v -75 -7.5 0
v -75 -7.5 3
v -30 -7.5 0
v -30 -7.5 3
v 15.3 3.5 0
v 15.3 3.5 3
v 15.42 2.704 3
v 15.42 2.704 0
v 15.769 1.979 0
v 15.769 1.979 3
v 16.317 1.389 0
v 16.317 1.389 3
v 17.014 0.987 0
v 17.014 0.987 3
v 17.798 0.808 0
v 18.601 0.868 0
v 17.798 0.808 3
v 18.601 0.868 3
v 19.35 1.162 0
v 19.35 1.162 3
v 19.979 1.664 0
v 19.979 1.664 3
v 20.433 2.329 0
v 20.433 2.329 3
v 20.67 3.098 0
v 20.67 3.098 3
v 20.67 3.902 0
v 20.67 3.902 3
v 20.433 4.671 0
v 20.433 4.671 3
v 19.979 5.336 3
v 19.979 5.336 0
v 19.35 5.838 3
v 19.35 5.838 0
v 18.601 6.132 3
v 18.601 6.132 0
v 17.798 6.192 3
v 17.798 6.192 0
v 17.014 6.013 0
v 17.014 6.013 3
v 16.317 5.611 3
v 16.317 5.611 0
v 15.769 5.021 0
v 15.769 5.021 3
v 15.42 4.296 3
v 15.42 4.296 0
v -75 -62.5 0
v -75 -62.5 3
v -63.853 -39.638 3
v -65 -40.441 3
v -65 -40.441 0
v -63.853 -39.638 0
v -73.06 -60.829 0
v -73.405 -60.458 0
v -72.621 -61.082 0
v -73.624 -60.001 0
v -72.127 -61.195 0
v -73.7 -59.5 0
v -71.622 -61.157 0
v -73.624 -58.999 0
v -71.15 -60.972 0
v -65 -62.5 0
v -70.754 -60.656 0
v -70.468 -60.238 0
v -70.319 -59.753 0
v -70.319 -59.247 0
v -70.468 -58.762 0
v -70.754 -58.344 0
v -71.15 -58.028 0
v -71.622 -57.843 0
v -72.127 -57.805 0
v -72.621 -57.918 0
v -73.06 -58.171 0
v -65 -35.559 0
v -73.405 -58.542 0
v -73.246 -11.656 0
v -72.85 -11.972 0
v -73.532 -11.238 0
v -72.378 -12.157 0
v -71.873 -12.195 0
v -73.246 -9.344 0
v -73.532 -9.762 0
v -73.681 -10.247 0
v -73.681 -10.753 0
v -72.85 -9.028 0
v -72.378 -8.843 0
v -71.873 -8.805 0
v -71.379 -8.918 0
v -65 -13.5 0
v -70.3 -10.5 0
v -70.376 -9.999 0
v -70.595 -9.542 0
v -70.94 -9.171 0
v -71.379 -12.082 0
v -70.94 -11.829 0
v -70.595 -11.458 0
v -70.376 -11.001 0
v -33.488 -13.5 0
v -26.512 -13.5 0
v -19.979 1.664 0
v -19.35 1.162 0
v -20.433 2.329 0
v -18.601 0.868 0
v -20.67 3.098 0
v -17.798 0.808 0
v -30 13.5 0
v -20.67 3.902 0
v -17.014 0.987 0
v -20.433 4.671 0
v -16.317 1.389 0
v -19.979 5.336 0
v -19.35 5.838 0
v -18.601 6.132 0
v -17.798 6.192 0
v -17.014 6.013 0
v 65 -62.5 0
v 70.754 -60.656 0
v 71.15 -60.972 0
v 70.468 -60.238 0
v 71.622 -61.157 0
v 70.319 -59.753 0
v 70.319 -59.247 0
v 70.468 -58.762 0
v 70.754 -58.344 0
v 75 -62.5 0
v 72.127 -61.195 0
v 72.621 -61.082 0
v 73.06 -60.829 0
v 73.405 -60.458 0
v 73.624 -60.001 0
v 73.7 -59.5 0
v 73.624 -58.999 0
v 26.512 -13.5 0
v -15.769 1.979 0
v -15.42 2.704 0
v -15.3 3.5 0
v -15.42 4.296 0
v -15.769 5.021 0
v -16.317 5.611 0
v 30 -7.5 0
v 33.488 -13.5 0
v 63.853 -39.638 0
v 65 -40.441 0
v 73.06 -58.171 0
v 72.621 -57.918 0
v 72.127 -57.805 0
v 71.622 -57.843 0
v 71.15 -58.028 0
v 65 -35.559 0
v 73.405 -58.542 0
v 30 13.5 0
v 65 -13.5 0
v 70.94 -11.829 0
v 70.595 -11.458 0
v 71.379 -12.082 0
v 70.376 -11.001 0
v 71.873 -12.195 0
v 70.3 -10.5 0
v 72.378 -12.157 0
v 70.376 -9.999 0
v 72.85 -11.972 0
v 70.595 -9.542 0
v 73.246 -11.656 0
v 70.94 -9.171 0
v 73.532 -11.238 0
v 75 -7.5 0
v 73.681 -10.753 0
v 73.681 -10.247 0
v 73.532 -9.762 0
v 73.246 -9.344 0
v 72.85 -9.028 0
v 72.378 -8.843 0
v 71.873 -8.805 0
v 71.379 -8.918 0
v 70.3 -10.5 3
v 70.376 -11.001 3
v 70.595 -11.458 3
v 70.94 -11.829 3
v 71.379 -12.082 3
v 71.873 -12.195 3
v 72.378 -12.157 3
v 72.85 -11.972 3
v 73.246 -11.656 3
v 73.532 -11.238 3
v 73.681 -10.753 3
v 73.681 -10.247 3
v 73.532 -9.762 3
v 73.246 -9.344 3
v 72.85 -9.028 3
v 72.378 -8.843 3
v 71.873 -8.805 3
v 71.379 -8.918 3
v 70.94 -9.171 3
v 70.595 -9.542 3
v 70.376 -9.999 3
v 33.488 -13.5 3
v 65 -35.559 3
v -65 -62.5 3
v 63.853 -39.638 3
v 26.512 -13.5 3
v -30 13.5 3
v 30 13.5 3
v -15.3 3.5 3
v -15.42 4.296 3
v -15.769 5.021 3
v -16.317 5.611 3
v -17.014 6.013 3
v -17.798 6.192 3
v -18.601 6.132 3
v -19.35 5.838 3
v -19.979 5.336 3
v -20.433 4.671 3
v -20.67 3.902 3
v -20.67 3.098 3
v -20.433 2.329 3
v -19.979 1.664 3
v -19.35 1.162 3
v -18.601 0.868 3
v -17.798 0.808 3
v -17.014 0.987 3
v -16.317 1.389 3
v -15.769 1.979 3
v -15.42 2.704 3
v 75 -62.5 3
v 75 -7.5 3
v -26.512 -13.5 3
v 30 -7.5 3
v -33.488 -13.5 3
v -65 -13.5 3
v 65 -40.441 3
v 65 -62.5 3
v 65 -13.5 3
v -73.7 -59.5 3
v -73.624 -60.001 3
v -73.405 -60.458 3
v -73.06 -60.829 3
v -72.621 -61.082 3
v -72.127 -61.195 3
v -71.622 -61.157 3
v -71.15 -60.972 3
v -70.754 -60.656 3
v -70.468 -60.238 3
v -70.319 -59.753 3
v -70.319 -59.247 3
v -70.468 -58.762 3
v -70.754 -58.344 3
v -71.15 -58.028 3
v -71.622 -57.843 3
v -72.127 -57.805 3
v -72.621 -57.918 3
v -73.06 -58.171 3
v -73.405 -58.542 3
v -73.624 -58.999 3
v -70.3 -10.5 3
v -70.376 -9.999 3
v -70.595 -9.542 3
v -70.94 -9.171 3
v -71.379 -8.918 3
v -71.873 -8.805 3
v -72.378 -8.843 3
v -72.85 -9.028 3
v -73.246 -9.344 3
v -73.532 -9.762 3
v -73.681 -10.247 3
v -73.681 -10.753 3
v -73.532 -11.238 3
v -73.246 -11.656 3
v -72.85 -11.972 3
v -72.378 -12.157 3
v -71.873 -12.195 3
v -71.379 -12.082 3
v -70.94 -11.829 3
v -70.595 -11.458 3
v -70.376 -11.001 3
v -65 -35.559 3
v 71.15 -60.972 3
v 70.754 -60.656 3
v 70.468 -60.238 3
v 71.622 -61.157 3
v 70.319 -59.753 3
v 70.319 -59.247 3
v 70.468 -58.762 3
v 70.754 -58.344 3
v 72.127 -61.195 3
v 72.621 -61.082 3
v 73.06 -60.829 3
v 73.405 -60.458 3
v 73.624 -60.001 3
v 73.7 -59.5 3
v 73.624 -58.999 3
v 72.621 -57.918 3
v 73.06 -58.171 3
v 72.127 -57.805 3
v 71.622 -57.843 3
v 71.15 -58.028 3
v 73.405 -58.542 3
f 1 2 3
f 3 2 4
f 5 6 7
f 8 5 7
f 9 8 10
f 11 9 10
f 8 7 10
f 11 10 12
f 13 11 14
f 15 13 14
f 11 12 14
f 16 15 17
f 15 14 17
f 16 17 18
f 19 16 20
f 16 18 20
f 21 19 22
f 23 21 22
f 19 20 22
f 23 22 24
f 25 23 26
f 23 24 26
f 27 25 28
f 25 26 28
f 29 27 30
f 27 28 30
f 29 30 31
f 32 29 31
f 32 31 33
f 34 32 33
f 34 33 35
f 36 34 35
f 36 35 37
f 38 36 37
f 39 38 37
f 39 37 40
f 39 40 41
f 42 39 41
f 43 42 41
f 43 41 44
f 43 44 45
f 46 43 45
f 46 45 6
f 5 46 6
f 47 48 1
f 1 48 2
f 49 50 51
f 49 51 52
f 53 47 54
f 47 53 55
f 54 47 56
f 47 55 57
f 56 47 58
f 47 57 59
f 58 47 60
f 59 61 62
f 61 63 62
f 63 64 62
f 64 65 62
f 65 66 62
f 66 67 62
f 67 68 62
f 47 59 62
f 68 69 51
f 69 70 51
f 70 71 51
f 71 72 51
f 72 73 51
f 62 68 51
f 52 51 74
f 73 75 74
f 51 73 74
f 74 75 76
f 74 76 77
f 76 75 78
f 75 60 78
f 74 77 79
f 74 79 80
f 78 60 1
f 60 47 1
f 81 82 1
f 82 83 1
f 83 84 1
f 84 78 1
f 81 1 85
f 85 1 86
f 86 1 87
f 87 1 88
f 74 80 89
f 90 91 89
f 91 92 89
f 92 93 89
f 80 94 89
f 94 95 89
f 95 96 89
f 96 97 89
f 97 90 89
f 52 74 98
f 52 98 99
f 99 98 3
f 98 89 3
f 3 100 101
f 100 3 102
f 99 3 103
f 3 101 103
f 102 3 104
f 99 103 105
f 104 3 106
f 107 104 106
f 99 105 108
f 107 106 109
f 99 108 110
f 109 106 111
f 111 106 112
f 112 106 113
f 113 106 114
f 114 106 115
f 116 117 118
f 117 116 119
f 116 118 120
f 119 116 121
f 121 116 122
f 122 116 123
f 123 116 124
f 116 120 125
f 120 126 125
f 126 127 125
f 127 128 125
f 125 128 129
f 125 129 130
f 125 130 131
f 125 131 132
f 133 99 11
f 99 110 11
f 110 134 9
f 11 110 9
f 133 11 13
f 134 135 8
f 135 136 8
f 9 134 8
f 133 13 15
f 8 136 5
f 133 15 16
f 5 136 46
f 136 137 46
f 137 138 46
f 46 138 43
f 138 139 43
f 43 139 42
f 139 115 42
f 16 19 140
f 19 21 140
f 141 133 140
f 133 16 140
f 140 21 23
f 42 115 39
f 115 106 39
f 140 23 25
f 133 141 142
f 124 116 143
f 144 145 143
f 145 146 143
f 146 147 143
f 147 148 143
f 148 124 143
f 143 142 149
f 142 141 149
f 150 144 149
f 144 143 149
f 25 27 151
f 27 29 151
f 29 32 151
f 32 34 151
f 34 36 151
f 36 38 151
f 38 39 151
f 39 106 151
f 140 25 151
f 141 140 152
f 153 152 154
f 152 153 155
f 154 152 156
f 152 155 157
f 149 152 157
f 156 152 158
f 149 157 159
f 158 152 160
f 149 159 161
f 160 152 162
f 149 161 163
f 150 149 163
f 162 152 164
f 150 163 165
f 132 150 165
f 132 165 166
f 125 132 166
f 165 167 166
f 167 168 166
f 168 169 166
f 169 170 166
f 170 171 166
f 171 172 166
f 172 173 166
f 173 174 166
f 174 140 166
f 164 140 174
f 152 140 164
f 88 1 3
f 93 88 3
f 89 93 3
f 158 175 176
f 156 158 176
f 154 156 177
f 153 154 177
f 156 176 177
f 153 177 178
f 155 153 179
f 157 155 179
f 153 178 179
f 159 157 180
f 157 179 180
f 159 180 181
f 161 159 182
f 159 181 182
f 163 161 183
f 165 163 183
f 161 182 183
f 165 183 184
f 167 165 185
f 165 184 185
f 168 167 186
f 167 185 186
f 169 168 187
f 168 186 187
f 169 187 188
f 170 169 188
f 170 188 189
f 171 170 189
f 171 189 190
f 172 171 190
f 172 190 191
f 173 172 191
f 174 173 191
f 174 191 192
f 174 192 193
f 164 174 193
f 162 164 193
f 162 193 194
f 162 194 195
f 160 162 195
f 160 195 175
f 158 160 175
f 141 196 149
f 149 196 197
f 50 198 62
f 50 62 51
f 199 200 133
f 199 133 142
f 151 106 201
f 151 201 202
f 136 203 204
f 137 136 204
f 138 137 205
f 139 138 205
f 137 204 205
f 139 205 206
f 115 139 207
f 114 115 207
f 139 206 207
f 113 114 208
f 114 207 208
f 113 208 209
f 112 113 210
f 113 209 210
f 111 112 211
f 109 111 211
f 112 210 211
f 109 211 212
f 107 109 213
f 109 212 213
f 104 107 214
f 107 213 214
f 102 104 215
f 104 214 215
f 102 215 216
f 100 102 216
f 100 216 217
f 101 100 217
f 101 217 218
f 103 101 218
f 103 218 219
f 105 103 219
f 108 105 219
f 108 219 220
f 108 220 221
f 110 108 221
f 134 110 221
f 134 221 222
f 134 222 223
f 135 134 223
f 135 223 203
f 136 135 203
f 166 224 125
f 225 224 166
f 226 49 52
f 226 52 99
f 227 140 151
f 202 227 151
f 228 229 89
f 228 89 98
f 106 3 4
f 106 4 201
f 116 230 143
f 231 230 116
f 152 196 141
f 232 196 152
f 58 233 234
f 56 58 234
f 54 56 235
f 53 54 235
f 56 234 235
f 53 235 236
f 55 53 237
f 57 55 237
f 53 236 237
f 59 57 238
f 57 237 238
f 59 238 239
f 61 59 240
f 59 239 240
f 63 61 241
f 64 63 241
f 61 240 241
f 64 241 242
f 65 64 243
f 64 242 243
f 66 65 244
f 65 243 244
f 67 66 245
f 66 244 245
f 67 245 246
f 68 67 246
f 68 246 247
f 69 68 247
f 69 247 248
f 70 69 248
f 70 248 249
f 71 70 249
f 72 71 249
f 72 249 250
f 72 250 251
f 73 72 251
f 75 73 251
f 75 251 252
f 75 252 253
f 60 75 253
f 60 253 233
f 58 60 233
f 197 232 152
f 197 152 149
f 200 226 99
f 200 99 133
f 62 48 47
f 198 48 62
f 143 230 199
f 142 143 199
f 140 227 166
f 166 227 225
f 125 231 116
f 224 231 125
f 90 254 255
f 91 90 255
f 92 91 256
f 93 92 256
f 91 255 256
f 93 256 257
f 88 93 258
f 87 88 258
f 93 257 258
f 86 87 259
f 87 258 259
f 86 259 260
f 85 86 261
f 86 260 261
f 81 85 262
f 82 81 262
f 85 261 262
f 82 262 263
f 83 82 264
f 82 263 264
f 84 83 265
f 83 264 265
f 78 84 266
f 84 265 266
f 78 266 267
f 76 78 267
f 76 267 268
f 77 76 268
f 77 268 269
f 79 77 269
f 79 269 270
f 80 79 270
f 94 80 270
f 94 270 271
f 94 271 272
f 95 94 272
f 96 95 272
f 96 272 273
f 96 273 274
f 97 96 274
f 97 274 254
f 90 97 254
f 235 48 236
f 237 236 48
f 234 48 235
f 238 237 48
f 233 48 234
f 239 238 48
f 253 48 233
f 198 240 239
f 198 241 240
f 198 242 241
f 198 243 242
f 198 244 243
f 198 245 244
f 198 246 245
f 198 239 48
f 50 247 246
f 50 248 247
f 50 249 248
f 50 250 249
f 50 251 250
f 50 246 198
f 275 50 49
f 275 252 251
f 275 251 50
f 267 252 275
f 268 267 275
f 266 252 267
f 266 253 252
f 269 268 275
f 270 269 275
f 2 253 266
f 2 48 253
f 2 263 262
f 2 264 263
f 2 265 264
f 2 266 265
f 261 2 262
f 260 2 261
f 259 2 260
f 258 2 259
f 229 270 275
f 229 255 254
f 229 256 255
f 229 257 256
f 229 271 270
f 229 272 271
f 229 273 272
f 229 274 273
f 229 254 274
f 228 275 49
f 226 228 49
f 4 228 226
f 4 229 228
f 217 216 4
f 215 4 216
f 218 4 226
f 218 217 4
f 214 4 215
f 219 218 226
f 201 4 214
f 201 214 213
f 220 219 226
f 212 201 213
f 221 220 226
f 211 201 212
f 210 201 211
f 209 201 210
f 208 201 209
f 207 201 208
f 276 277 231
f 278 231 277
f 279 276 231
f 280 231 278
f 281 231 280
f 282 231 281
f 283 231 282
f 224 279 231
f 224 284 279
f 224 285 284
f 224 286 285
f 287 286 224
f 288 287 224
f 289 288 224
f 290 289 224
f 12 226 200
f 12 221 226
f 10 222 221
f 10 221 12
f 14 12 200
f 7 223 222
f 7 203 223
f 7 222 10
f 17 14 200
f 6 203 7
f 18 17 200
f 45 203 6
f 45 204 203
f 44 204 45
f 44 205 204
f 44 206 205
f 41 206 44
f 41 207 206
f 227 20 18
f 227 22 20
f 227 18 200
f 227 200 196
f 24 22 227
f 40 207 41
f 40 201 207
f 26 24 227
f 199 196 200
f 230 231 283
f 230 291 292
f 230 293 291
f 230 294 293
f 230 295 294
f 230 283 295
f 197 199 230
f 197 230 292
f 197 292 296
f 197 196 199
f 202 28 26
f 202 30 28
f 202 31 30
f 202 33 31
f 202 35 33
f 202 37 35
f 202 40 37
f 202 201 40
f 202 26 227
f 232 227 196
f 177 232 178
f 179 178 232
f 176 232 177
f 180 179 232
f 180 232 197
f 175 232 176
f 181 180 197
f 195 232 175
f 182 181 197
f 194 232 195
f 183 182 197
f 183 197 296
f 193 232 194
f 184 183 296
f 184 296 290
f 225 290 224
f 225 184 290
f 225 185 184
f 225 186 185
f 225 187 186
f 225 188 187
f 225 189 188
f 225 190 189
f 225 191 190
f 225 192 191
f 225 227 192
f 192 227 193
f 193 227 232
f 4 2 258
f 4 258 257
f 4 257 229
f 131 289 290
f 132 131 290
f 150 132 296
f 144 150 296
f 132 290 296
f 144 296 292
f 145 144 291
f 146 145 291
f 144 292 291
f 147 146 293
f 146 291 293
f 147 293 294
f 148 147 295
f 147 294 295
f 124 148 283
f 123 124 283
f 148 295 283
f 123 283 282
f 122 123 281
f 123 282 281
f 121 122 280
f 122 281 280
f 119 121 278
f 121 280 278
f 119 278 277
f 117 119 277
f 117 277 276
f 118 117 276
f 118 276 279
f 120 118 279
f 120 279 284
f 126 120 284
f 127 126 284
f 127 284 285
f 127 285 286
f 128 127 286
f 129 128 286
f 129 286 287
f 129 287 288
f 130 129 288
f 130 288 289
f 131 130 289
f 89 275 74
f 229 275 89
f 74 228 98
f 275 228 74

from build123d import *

# Parameters (mm, degrees)
SKETCH_1_W          = 60
SKETCH_1_H          = 27
EXTRUDE_1_DEPTH     = 3
SKETCH_2_W          = 150
SKETCH_2_H          = 6
EXTRUDE_2_DEPTH     = 3
EXTRUDE_3_DEPTH     = 3
SKETCH_4_R          = 1.7
CUT_EXTRUDE_1_DEPTH = 98.67420335
EXTRUDE_4_DEPTH     = 3
SKETCH_6_R          = 2.7
CUT_EXTRUDE_2_DEPTH = 98.67420335


with BuildPart() as part:
    # 草圖1 → 填料-伸長1 (new body)
    with BuildSketch(Plane.XY):
        Rectangle(SKETCH_1_W, SKETCH_1_H)
    extrude(amount=EXTRUDE_1_DEPTH)

    # 草圖2 → 填料-伸長2 (add)
    with BuildSketch(Plane.XY.offset(3)):
        with Locations((0, -10.5)):
            Rectangle(SKETCH_2_W, SKETCH_2_H)
    extrude(amount=-EXTRUDE_2_DEPTH)

    # 草圖3 → 填料-伸長3 (add)
    with BuildSketch(Plane.XY.offset(3)):
        Polygon((65, -62.5), (75, -62.5), (75, -7.5), (-75, -7.5), (-75, -62.5), (-65, -62.5), (-65, -13.5), (65, -13.5), align=None)
    extrude(amount=-EXTRUDE_3_DEPTH)

    # 草圖4 → 除料-伸長1 (cut, through all)
    with BuildSketch(Plane.XY.offset(3)):
        with Locations((-72, -10.5)):
            Circle(SKETCH_4_R)
        with Locations(Location((-72, -59.5, 0), (0, 0, 180))):
            Circle(SKETCH_4_R)
        with Locations((72, -59.5)):
            Circle(SKETCH_4_R)
        with Locations(Location((72, -10.5, 0), (0, 0, 180))):
            Circle(SKETCH_4_R)
    extrude(amount=-CUT_EXTRUDE_1_DEPTH, mode=Mode.SUBTRACT)

    # 草圖5 → 填料-伸長4 (add)
    with BuildSketch(Plane.XY.offset(3)):
        Polygon((-63.853075311, -39.638463841), (-28.853075311, -15.138463841), (-26.512412681, -13.5), (-33.487587319, -13.5), (-65, -35.558688877), (-65, -38), (-65, -40.441311123), align=None)
        Polygon((26.512412681, -13.5), (33.487587319, -13.5), (65, -35.558688877), (65, -38), (65, -40.441311123), (63.853075311, -39.638463841), (28.853075311, -15.138463841), align=None)
    extrude(amount=-EXTRUDE_4_DEPTH)

    # 草圖6 → 除料-伸長2 (cut, through all)
    with BuildSketch(Plane.XY.offset(3)):
        with Locations((-18, 3.5)):
            Circle(SKETCH_6_R)
        with Locations(Location((18, 3.5, 0), (0, 0, 180))):
            Circle(SKETCH_6_R)
    extrude(amount=-CUT_EXTRUDE_2_DEPTH, mode=Mode.SUBTRACT)


solid = part.part
